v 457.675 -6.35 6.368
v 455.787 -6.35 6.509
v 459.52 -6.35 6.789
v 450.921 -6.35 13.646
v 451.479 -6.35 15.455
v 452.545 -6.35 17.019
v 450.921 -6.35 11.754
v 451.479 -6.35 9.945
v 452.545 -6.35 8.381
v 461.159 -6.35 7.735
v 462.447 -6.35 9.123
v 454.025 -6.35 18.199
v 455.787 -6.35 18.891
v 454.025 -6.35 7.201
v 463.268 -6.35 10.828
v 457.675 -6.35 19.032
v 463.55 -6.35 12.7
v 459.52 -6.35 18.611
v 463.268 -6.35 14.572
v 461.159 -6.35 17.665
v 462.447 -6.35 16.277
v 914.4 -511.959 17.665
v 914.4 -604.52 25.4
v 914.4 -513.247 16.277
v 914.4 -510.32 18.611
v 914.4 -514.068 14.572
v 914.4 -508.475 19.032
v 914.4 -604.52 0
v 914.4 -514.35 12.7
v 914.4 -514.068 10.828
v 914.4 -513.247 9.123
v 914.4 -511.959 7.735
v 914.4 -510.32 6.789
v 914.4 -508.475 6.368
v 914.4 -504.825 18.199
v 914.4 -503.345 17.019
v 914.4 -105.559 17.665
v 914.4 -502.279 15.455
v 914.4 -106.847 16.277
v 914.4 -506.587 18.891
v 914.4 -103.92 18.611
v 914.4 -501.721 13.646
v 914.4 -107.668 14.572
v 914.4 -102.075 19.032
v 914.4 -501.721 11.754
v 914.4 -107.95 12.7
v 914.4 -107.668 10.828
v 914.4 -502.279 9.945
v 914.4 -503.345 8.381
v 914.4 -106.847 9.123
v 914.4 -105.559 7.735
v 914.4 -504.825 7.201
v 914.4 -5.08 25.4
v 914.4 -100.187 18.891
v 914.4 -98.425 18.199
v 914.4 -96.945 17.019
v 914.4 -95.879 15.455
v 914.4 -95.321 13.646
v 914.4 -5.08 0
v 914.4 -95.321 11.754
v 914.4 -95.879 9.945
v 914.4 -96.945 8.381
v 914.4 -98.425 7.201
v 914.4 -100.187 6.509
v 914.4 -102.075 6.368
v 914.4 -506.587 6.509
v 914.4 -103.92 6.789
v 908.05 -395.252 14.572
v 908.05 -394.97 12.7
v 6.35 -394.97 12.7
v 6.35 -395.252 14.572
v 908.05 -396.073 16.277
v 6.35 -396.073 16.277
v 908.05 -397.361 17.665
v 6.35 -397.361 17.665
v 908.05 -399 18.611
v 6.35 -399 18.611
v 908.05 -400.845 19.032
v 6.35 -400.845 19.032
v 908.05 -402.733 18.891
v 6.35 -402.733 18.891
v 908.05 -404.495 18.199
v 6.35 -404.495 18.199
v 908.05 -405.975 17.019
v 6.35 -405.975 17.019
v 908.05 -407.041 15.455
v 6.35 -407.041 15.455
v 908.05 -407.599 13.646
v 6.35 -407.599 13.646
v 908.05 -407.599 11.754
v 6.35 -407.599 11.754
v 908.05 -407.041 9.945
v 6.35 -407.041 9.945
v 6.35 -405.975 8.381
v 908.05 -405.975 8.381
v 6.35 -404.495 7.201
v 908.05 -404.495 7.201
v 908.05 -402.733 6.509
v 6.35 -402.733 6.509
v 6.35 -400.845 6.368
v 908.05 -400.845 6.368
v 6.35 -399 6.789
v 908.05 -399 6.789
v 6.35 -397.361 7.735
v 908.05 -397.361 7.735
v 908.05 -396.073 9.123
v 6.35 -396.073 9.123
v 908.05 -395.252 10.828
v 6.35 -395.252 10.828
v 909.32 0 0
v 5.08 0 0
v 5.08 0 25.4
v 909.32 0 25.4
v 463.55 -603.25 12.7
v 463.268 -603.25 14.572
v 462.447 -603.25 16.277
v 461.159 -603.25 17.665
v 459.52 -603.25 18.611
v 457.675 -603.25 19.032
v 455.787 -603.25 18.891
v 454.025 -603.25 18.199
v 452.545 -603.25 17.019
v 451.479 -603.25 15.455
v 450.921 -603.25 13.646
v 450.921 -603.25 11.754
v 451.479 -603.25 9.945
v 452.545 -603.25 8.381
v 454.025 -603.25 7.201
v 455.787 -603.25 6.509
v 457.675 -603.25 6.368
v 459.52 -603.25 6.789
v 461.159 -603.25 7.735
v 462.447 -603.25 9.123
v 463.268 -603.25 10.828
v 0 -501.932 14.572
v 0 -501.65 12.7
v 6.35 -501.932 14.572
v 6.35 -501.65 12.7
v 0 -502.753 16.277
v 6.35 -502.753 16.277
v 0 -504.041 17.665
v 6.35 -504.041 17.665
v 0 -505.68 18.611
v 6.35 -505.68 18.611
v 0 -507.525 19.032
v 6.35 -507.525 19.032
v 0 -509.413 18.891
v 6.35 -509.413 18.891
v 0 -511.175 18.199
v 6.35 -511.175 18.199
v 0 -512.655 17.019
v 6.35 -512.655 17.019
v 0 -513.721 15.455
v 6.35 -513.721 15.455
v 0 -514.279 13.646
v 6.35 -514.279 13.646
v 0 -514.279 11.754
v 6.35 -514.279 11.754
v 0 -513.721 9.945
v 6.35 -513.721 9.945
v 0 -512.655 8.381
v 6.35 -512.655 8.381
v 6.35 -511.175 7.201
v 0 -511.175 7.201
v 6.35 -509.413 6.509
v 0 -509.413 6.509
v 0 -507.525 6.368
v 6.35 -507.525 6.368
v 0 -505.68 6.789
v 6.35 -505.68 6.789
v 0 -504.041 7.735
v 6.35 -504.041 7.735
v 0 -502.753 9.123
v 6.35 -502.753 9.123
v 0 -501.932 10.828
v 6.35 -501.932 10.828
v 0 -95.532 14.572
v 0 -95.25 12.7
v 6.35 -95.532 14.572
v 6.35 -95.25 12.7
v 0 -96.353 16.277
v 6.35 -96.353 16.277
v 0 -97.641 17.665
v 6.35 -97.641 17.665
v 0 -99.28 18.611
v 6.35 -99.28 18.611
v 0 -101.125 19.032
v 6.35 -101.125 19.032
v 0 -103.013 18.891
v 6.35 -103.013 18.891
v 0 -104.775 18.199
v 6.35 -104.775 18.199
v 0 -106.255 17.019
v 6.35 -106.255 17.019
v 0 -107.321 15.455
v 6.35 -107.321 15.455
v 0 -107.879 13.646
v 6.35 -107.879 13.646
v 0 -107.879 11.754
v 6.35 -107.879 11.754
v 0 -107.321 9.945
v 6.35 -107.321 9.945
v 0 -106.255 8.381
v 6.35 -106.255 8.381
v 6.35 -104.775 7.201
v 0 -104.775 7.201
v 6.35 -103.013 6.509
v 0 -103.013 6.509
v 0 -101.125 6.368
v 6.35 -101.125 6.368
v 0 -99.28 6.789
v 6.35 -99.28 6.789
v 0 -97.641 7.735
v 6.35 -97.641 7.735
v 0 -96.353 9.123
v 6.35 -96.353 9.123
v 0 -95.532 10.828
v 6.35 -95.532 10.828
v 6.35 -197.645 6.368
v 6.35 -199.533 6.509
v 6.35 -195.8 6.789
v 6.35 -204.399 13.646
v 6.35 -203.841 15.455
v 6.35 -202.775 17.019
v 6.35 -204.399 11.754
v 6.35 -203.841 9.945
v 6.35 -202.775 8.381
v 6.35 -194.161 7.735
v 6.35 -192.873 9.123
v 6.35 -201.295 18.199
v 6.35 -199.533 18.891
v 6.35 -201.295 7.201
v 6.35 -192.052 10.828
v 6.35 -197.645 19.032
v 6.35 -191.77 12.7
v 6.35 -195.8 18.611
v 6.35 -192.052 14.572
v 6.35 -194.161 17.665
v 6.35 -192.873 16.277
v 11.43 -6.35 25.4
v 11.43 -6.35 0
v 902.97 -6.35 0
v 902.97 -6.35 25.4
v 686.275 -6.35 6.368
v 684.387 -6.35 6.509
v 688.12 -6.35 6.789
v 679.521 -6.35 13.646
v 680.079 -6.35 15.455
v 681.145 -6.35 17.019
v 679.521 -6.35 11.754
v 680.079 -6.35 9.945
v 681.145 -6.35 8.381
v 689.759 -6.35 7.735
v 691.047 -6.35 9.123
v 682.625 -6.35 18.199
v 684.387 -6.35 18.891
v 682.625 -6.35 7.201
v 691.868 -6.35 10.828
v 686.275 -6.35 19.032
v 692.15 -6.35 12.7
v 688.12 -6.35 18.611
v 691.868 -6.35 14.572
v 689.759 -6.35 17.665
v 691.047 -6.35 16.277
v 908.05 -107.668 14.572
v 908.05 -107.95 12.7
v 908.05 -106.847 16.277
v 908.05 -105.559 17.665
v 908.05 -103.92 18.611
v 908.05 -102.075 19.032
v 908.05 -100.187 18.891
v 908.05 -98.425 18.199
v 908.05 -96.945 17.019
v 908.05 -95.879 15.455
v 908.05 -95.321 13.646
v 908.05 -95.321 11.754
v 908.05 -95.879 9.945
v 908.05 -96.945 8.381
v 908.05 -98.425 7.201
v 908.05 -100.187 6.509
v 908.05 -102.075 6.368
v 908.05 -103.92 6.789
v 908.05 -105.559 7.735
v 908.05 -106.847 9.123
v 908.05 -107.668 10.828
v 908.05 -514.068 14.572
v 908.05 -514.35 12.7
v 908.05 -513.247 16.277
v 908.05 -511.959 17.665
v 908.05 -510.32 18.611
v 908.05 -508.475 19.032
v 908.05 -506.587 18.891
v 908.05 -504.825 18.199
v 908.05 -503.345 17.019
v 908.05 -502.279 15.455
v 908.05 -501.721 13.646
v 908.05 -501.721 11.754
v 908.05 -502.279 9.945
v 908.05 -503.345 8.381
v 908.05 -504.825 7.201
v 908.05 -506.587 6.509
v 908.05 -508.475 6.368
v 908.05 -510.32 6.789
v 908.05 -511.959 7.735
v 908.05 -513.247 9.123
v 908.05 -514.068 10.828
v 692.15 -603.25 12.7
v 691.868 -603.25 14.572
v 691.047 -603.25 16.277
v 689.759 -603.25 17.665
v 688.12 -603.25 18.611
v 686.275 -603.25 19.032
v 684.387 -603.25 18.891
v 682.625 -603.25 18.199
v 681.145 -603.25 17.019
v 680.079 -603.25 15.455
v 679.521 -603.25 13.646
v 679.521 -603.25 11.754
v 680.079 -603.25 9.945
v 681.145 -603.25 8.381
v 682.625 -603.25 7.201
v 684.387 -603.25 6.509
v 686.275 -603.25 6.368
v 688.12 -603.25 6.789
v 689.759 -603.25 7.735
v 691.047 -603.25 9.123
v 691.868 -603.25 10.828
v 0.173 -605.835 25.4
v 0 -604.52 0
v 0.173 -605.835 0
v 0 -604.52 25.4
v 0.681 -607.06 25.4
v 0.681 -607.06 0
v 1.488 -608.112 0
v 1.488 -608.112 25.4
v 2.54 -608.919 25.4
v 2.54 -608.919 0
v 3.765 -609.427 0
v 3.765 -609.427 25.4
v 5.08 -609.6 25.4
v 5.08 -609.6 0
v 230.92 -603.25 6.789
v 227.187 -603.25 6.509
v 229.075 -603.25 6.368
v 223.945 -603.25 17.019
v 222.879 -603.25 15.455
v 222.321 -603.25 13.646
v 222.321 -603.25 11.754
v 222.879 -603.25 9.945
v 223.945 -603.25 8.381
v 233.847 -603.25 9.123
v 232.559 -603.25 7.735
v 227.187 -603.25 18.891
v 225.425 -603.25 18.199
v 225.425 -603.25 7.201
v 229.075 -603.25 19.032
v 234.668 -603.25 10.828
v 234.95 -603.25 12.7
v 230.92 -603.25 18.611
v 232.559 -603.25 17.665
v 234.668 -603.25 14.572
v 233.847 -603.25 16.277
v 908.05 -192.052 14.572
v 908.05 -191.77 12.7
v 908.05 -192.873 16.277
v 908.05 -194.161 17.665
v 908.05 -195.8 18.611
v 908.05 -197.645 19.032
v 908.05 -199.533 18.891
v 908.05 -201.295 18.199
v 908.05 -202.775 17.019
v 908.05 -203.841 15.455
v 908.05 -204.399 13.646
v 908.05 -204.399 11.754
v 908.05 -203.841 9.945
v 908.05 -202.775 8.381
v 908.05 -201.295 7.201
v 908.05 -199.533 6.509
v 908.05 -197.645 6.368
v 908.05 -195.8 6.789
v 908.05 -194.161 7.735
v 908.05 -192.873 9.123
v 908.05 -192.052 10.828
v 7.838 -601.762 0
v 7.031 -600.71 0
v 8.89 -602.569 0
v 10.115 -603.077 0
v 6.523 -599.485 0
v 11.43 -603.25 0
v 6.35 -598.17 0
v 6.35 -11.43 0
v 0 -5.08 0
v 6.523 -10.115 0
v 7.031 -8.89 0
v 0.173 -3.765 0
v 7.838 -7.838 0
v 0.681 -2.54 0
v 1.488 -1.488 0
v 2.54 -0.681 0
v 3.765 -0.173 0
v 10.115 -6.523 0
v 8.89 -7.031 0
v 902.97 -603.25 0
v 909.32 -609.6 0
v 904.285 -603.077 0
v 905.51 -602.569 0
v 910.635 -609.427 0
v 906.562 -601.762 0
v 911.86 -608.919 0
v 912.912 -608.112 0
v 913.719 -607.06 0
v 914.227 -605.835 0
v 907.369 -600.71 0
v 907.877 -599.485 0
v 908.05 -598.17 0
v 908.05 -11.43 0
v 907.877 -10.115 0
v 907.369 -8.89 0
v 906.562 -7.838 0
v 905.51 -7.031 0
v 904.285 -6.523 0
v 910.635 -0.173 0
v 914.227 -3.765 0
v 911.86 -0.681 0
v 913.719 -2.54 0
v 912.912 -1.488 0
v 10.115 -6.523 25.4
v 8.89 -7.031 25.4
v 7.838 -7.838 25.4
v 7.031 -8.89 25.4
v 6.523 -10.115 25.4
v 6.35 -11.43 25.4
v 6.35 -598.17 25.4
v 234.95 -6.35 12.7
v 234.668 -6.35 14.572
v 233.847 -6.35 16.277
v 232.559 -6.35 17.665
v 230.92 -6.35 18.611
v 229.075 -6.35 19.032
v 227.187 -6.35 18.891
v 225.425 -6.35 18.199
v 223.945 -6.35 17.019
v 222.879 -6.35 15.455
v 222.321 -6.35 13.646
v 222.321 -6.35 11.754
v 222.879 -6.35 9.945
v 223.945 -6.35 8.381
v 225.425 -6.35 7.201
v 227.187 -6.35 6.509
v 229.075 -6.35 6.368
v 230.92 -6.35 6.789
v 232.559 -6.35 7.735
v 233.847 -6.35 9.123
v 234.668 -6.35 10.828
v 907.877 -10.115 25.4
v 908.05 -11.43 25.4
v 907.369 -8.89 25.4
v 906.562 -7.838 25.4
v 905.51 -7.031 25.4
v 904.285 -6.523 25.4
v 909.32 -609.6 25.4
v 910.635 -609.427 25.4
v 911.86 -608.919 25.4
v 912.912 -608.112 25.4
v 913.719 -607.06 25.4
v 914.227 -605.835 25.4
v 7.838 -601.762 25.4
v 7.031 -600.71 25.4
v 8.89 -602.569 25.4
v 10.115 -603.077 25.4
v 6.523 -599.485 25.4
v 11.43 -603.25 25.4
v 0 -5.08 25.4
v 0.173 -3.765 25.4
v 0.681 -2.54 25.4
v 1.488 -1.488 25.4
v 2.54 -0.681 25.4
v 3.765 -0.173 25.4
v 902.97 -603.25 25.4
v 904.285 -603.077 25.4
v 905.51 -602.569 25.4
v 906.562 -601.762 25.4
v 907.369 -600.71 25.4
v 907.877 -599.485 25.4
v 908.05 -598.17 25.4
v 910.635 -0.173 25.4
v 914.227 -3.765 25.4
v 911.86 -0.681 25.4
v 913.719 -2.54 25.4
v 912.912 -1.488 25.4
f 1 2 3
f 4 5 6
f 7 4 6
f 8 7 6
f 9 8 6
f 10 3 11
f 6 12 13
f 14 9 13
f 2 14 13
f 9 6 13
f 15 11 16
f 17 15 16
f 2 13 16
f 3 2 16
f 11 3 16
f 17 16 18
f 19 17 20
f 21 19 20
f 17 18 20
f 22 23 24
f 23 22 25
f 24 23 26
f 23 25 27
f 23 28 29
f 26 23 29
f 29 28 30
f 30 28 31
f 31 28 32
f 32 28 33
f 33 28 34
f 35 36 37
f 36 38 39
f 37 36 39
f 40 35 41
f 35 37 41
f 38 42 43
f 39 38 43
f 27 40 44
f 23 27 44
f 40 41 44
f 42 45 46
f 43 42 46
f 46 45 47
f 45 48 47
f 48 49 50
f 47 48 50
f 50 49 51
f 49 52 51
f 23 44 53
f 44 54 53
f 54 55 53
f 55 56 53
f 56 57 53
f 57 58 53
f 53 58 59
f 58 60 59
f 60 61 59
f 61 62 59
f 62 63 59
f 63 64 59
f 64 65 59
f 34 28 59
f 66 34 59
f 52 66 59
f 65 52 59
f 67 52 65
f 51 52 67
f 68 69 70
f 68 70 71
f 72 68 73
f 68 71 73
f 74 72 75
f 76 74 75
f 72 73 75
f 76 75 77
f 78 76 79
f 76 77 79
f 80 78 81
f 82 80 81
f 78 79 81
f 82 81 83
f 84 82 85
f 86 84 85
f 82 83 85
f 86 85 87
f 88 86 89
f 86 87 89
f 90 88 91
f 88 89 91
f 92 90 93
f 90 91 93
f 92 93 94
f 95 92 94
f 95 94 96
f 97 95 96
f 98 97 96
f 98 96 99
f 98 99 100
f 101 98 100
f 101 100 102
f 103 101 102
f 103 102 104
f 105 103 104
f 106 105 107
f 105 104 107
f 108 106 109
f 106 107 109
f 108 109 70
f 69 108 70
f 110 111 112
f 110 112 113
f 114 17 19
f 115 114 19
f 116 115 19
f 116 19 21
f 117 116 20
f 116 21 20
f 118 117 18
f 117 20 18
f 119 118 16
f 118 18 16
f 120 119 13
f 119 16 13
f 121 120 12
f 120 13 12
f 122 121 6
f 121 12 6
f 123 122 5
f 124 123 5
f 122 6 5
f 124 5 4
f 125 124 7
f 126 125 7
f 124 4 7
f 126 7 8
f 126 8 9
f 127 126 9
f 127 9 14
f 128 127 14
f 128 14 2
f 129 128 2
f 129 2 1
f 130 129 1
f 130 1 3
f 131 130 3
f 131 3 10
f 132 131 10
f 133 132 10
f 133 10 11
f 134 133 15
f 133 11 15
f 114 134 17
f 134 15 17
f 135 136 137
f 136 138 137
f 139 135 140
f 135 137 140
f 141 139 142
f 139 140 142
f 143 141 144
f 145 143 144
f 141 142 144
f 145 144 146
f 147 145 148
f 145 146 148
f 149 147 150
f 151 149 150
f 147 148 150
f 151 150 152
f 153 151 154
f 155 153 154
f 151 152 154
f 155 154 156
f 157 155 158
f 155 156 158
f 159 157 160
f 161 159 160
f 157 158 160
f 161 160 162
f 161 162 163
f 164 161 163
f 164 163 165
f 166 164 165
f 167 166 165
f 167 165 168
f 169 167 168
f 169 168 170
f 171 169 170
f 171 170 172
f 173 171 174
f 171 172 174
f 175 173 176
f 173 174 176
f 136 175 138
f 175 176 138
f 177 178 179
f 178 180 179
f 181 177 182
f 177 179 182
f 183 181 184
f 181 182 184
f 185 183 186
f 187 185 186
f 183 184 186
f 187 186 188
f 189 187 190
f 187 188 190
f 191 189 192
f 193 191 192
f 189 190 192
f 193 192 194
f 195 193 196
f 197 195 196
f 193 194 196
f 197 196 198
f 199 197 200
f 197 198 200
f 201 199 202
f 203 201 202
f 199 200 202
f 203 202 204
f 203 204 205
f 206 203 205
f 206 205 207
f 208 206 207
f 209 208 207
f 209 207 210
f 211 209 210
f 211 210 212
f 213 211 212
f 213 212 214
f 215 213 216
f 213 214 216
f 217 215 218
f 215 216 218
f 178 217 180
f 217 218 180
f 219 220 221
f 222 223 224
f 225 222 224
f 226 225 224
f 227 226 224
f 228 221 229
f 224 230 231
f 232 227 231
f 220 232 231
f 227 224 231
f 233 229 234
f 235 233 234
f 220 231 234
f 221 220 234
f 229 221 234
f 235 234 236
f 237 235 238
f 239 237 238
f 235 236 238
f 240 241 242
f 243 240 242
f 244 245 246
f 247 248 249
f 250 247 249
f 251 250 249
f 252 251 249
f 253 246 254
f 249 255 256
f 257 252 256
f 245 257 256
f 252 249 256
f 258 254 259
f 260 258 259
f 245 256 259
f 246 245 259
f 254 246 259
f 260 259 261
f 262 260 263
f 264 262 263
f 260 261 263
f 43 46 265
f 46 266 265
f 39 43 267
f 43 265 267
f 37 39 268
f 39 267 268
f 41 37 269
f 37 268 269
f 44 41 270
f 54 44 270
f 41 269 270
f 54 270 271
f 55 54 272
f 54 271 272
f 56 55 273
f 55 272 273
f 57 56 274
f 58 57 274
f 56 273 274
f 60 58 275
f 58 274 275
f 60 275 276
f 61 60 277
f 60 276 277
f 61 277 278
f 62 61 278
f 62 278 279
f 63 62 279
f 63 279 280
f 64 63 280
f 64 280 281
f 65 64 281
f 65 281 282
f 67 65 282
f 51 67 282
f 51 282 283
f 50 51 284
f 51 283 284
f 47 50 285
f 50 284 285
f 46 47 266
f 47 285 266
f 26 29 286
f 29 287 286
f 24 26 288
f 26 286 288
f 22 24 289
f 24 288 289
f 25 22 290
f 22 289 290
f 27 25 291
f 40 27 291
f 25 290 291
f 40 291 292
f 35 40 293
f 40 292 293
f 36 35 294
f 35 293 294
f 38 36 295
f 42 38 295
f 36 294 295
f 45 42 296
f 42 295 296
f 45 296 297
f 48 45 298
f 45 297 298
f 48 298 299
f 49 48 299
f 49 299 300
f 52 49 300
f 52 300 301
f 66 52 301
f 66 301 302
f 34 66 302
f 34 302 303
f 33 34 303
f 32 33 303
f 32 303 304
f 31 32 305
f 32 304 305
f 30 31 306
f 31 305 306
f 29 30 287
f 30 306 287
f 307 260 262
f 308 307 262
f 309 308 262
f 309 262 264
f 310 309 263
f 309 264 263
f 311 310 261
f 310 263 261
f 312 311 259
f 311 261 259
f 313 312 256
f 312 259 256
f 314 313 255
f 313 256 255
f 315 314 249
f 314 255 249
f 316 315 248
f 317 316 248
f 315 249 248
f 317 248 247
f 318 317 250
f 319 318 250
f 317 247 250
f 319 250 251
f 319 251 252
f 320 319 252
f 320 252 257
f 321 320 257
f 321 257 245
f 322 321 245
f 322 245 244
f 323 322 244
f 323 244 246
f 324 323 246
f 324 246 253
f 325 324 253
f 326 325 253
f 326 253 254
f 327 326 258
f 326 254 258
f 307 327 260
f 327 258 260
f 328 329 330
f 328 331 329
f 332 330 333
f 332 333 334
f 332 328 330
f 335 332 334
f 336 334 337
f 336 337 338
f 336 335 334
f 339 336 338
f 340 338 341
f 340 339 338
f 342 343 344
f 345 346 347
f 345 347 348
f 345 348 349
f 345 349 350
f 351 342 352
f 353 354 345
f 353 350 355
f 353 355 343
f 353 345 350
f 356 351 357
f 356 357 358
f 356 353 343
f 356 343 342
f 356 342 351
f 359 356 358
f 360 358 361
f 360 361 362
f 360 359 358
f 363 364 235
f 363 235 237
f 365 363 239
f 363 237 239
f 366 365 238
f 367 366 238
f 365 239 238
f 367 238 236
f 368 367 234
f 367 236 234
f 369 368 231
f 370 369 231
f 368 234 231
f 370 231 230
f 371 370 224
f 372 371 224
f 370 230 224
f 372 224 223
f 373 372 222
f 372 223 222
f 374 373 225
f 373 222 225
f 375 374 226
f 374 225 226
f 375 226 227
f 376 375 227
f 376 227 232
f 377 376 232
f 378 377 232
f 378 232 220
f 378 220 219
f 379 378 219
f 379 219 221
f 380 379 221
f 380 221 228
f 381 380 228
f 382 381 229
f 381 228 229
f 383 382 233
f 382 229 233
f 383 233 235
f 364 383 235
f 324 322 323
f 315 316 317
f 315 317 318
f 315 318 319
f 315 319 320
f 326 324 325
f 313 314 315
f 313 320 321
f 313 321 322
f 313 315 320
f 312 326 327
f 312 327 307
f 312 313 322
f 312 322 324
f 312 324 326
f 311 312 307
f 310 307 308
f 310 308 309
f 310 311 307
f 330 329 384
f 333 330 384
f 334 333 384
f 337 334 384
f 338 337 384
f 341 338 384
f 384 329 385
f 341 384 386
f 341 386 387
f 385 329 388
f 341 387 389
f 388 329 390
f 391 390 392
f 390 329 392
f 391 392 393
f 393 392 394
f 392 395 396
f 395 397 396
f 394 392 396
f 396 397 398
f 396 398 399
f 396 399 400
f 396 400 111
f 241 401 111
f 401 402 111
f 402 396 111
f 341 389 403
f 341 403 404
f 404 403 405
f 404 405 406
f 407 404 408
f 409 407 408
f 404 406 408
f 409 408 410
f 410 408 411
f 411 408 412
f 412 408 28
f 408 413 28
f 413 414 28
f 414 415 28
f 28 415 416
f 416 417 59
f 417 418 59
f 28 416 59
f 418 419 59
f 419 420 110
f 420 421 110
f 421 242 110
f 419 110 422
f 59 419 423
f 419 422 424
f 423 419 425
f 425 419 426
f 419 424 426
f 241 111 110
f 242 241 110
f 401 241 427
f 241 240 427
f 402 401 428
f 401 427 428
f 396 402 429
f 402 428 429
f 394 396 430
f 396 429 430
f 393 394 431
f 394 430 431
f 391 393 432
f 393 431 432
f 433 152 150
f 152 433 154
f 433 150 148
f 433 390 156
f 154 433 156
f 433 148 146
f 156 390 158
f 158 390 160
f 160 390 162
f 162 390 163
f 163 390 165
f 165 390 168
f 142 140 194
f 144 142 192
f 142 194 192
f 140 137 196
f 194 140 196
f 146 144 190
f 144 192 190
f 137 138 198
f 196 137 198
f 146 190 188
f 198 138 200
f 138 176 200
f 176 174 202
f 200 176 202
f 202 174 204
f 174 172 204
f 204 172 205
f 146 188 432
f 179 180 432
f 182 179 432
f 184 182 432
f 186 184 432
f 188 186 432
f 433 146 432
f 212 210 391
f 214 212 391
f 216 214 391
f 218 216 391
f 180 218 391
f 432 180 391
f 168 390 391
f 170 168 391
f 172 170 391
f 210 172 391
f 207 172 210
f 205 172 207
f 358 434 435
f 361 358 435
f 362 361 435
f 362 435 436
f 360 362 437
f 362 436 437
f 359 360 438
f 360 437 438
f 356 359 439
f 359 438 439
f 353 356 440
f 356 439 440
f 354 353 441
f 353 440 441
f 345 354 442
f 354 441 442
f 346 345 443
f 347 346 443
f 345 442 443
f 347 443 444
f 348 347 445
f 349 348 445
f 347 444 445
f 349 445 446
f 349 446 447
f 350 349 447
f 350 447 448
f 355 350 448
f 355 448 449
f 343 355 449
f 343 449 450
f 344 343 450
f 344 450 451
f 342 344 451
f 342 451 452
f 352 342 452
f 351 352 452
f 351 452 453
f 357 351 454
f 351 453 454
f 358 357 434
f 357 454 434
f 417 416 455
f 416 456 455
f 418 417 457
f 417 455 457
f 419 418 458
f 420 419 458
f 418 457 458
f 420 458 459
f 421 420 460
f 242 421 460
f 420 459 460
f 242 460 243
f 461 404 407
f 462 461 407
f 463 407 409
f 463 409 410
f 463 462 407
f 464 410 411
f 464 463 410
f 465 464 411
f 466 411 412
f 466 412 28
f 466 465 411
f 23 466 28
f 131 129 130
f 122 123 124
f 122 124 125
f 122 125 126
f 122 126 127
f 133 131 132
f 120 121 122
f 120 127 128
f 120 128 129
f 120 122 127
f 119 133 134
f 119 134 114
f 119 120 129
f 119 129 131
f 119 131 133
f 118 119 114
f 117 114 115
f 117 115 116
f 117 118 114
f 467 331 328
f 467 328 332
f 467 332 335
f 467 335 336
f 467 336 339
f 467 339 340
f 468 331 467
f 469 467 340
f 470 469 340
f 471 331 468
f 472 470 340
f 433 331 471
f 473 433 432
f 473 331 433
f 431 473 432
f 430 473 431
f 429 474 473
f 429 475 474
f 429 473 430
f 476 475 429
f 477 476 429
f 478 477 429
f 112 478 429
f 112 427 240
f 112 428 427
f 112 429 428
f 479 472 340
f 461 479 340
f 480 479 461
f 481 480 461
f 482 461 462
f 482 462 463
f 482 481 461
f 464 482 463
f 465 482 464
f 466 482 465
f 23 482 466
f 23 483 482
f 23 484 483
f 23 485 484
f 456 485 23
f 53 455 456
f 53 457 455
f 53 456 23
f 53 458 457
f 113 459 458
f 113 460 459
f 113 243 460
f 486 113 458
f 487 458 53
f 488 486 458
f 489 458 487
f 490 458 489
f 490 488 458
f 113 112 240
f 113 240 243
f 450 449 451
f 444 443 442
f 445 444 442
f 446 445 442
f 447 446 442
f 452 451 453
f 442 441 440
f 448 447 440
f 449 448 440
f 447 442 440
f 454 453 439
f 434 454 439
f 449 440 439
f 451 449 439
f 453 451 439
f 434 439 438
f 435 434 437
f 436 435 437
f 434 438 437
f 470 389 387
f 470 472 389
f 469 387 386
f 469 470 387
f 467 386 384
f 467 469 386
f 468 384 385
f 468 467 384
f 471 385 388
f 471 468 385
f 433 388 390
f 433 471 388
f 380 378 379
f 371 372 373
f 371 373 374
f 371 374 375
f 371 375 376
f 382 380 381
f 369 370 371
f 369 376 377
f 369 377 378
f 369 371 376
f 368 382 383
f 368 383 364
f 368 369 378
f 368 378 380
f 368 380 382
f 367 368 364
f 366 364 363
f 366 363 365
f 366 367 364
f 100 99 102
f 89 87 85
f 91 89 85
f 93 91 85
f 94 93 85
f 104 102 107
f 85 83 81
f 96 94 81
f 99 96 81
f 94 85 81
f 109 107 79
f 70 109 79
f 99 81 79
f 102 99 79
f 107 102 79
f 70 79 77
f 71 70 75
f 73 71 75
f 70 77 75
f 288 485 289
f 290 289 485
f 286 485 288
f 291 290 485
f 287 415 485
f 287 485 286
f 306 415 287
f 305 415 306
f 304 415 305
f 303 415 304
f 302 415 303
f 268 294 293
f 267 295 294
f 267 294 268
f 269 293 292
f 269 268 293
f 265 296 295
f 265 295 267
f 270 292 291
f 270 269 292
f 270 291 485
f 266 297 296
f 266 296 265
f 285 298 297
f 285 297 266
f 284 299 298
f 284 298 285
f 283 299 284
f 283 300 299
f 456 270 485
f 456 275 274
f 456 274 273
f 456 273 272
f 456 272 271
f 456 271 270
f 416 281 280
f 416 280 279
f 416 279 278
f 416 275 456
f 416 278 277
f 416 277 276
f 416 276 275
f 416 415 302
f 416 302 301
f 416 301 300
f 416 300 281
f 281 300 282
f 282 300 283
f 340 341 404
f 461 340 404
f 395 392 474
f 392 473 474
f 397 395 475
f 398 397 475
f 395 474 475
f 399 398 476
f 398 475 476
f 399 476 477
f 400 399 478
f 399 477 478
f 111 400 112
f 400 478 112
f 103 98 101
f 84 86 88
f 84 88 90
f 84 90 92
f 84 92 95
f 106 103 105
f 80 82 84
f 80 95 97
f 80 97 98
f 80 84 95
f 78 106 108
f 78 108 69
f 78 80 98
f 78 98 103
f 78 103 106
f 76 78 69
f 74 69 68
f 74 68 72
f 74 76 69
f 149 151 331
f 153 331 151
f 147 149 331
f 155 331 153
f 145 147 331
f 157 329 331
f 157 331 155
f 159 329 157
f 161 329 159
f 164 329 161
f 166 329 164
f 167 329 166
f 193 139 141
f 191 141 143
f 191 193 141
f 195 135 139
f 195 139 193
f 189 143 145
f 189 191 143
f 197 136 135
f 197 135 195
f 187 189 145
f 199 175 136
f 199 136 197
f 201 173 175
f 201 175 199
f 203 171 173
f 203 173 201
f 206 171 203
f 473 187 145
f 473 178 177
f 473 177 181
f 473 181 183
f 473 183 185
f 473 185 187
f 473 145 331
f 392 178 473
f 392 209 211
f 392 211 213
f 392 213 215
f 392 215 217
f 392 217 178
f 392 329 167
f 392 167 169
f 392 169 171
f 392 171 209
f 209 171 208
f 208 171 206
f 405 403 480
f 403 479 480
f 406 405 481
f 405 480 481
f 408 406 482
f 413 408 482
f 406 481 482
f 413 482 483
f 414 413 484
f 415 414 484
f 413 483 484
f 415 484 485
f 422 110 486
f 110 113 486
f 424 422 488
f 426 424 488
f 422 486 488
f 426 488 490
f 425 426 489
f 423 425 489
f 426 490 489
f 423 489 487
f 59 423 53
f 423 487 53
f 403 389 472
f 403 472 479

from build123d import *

# Parameters (mm, degrees)
F0_W      = 914.4
F0_H      = 609.6
F0_W_2    = 901.7
F0_H_2    = 596.9
F1_DEPTH  = 25.4
F2_R      = 5.08
F3_R      = 6.35
F4_DEPTH  = 901.7
F5_R      = 6.35
F6_DEPTH  = 596.9
F8_D      = 12.7
F8_DEPTH  = 6.35
F8_TIP    = 3.8154649308
F10_D     = 12.7
F10_DEPTH = 6.35
F10_TIP   = 3.8154649308


# Not quite as in the source:
# - a length typed as a fraction of an inch, garbled in the dataset ("3 / 203.2 mm" for 3/8 in), is restored


with BuildPart() as f1:
    # F0 (on Top) → F1 (new body)
    with BuildSketch(Plane.XY):
        with Locations((457.2, -304.8)):
            Rectangle(F0_W, F0_H)
        with Locations((457.2, -304.8)):
            Rectangle(F0_W_2, F0_H_2, mode=Mode.SUBTRACT)
    extrude(amount=F1_DEPTH)

    # F2
    f2_edges = [f1.edges().sort_by_distance(p)[0] for p in [
        (914.4, 0, 12.7),
        (908.05, -603.25, 12.7),
        (0, 0, 12.7),
        (6.35, -603.25, 12.7),
        (914.4, -609.6, 12.7),
        (0, -609.6, 12.7),
        (908.05, -6.35, 12.7),
        (6.35, -6.35, 12.7),
    ]]
    fillet(f2_edges, radius=F2_R)

    # F8
    with Locations(Plane(origin=(0, 0, 0), x_dir=(0, -1, 0), z_dir=(-1, 0, 0))):
        with Locations((101.6, 12.7), (508, 12.7)):
            Hole(F8_D / 2, depth=F8_DEPTH)
            with Locations((0, 0, -(F8_DEPTH + F8_TIP / 2))):  # 118° drill point
                Cone(0, F8_D / 2, F8_TIP, mode=Mode.SUBTRACT)

    # F10
    with Locations(Plane.YZ.offset(914.4)):
        with Locations((-508, 12.7), (-101.6, 12.7)):
            Hole(F10_D / 2, depth=F10_DEPTH)
            with Locations((0, 0, -(F10_DEPTH + F10_TIP / 2))):  # 118° drill point
                Cone(0, F10_D / 2, F10_TIP, mode=Mode.SUBTRACT)


with BuildPart() as f4:
    # F3 (on face) → F4 (new body, through all)
    with BuildSketch(Plane.YZ.offset(6.35)):
        with Locations((-401.32, 12.7)):
            Circle(F3_R)
    extrude(amount=F4_DEPTH)


with BuildPart() as f4b:
    # F3 (on face) → F4, piece 2 (new body, through all)
    with BuildSketch(Plane.YZ.offset(6.35)):
        with Locations((-198.12, 12.7)):
            Circle(F3_R)
    extrude(amount=F4_DEPTH)


with BuildPart() as f6:
    # F5 (on face) → F6 (new body, through all)
    with BuildSketch(Plane.XZ.offset(6.35)):
        with Locations((228.6, 12.7)):
            Circle(F5_R)
    extrude(amount=F6_DEPTH)


with BuildPart() as f6b:
    # F5 (on face) → F6, piece 2 (new body, through all)
    with BuildSketch(Plane.XZ.offset(6.35)):
        with Locations((457.2, 12.7)):
            Circle(F5_R)
    extrude(amount=F6_DEPTH)


with BuildPart() as f6c:
    # F5 (on face) → F6, piece 3 (new body, through all)
    with BuildSketch(Plane.XZ.offset(6.35)):
        with Locations((685.8, 12.7)):
            Circle(F5_R)
    extrude(amount=F6_DEPTH)


solid = Compound([f1.part, f4.part, f4b.part, f6.part, f6b.part, f6c.part])
